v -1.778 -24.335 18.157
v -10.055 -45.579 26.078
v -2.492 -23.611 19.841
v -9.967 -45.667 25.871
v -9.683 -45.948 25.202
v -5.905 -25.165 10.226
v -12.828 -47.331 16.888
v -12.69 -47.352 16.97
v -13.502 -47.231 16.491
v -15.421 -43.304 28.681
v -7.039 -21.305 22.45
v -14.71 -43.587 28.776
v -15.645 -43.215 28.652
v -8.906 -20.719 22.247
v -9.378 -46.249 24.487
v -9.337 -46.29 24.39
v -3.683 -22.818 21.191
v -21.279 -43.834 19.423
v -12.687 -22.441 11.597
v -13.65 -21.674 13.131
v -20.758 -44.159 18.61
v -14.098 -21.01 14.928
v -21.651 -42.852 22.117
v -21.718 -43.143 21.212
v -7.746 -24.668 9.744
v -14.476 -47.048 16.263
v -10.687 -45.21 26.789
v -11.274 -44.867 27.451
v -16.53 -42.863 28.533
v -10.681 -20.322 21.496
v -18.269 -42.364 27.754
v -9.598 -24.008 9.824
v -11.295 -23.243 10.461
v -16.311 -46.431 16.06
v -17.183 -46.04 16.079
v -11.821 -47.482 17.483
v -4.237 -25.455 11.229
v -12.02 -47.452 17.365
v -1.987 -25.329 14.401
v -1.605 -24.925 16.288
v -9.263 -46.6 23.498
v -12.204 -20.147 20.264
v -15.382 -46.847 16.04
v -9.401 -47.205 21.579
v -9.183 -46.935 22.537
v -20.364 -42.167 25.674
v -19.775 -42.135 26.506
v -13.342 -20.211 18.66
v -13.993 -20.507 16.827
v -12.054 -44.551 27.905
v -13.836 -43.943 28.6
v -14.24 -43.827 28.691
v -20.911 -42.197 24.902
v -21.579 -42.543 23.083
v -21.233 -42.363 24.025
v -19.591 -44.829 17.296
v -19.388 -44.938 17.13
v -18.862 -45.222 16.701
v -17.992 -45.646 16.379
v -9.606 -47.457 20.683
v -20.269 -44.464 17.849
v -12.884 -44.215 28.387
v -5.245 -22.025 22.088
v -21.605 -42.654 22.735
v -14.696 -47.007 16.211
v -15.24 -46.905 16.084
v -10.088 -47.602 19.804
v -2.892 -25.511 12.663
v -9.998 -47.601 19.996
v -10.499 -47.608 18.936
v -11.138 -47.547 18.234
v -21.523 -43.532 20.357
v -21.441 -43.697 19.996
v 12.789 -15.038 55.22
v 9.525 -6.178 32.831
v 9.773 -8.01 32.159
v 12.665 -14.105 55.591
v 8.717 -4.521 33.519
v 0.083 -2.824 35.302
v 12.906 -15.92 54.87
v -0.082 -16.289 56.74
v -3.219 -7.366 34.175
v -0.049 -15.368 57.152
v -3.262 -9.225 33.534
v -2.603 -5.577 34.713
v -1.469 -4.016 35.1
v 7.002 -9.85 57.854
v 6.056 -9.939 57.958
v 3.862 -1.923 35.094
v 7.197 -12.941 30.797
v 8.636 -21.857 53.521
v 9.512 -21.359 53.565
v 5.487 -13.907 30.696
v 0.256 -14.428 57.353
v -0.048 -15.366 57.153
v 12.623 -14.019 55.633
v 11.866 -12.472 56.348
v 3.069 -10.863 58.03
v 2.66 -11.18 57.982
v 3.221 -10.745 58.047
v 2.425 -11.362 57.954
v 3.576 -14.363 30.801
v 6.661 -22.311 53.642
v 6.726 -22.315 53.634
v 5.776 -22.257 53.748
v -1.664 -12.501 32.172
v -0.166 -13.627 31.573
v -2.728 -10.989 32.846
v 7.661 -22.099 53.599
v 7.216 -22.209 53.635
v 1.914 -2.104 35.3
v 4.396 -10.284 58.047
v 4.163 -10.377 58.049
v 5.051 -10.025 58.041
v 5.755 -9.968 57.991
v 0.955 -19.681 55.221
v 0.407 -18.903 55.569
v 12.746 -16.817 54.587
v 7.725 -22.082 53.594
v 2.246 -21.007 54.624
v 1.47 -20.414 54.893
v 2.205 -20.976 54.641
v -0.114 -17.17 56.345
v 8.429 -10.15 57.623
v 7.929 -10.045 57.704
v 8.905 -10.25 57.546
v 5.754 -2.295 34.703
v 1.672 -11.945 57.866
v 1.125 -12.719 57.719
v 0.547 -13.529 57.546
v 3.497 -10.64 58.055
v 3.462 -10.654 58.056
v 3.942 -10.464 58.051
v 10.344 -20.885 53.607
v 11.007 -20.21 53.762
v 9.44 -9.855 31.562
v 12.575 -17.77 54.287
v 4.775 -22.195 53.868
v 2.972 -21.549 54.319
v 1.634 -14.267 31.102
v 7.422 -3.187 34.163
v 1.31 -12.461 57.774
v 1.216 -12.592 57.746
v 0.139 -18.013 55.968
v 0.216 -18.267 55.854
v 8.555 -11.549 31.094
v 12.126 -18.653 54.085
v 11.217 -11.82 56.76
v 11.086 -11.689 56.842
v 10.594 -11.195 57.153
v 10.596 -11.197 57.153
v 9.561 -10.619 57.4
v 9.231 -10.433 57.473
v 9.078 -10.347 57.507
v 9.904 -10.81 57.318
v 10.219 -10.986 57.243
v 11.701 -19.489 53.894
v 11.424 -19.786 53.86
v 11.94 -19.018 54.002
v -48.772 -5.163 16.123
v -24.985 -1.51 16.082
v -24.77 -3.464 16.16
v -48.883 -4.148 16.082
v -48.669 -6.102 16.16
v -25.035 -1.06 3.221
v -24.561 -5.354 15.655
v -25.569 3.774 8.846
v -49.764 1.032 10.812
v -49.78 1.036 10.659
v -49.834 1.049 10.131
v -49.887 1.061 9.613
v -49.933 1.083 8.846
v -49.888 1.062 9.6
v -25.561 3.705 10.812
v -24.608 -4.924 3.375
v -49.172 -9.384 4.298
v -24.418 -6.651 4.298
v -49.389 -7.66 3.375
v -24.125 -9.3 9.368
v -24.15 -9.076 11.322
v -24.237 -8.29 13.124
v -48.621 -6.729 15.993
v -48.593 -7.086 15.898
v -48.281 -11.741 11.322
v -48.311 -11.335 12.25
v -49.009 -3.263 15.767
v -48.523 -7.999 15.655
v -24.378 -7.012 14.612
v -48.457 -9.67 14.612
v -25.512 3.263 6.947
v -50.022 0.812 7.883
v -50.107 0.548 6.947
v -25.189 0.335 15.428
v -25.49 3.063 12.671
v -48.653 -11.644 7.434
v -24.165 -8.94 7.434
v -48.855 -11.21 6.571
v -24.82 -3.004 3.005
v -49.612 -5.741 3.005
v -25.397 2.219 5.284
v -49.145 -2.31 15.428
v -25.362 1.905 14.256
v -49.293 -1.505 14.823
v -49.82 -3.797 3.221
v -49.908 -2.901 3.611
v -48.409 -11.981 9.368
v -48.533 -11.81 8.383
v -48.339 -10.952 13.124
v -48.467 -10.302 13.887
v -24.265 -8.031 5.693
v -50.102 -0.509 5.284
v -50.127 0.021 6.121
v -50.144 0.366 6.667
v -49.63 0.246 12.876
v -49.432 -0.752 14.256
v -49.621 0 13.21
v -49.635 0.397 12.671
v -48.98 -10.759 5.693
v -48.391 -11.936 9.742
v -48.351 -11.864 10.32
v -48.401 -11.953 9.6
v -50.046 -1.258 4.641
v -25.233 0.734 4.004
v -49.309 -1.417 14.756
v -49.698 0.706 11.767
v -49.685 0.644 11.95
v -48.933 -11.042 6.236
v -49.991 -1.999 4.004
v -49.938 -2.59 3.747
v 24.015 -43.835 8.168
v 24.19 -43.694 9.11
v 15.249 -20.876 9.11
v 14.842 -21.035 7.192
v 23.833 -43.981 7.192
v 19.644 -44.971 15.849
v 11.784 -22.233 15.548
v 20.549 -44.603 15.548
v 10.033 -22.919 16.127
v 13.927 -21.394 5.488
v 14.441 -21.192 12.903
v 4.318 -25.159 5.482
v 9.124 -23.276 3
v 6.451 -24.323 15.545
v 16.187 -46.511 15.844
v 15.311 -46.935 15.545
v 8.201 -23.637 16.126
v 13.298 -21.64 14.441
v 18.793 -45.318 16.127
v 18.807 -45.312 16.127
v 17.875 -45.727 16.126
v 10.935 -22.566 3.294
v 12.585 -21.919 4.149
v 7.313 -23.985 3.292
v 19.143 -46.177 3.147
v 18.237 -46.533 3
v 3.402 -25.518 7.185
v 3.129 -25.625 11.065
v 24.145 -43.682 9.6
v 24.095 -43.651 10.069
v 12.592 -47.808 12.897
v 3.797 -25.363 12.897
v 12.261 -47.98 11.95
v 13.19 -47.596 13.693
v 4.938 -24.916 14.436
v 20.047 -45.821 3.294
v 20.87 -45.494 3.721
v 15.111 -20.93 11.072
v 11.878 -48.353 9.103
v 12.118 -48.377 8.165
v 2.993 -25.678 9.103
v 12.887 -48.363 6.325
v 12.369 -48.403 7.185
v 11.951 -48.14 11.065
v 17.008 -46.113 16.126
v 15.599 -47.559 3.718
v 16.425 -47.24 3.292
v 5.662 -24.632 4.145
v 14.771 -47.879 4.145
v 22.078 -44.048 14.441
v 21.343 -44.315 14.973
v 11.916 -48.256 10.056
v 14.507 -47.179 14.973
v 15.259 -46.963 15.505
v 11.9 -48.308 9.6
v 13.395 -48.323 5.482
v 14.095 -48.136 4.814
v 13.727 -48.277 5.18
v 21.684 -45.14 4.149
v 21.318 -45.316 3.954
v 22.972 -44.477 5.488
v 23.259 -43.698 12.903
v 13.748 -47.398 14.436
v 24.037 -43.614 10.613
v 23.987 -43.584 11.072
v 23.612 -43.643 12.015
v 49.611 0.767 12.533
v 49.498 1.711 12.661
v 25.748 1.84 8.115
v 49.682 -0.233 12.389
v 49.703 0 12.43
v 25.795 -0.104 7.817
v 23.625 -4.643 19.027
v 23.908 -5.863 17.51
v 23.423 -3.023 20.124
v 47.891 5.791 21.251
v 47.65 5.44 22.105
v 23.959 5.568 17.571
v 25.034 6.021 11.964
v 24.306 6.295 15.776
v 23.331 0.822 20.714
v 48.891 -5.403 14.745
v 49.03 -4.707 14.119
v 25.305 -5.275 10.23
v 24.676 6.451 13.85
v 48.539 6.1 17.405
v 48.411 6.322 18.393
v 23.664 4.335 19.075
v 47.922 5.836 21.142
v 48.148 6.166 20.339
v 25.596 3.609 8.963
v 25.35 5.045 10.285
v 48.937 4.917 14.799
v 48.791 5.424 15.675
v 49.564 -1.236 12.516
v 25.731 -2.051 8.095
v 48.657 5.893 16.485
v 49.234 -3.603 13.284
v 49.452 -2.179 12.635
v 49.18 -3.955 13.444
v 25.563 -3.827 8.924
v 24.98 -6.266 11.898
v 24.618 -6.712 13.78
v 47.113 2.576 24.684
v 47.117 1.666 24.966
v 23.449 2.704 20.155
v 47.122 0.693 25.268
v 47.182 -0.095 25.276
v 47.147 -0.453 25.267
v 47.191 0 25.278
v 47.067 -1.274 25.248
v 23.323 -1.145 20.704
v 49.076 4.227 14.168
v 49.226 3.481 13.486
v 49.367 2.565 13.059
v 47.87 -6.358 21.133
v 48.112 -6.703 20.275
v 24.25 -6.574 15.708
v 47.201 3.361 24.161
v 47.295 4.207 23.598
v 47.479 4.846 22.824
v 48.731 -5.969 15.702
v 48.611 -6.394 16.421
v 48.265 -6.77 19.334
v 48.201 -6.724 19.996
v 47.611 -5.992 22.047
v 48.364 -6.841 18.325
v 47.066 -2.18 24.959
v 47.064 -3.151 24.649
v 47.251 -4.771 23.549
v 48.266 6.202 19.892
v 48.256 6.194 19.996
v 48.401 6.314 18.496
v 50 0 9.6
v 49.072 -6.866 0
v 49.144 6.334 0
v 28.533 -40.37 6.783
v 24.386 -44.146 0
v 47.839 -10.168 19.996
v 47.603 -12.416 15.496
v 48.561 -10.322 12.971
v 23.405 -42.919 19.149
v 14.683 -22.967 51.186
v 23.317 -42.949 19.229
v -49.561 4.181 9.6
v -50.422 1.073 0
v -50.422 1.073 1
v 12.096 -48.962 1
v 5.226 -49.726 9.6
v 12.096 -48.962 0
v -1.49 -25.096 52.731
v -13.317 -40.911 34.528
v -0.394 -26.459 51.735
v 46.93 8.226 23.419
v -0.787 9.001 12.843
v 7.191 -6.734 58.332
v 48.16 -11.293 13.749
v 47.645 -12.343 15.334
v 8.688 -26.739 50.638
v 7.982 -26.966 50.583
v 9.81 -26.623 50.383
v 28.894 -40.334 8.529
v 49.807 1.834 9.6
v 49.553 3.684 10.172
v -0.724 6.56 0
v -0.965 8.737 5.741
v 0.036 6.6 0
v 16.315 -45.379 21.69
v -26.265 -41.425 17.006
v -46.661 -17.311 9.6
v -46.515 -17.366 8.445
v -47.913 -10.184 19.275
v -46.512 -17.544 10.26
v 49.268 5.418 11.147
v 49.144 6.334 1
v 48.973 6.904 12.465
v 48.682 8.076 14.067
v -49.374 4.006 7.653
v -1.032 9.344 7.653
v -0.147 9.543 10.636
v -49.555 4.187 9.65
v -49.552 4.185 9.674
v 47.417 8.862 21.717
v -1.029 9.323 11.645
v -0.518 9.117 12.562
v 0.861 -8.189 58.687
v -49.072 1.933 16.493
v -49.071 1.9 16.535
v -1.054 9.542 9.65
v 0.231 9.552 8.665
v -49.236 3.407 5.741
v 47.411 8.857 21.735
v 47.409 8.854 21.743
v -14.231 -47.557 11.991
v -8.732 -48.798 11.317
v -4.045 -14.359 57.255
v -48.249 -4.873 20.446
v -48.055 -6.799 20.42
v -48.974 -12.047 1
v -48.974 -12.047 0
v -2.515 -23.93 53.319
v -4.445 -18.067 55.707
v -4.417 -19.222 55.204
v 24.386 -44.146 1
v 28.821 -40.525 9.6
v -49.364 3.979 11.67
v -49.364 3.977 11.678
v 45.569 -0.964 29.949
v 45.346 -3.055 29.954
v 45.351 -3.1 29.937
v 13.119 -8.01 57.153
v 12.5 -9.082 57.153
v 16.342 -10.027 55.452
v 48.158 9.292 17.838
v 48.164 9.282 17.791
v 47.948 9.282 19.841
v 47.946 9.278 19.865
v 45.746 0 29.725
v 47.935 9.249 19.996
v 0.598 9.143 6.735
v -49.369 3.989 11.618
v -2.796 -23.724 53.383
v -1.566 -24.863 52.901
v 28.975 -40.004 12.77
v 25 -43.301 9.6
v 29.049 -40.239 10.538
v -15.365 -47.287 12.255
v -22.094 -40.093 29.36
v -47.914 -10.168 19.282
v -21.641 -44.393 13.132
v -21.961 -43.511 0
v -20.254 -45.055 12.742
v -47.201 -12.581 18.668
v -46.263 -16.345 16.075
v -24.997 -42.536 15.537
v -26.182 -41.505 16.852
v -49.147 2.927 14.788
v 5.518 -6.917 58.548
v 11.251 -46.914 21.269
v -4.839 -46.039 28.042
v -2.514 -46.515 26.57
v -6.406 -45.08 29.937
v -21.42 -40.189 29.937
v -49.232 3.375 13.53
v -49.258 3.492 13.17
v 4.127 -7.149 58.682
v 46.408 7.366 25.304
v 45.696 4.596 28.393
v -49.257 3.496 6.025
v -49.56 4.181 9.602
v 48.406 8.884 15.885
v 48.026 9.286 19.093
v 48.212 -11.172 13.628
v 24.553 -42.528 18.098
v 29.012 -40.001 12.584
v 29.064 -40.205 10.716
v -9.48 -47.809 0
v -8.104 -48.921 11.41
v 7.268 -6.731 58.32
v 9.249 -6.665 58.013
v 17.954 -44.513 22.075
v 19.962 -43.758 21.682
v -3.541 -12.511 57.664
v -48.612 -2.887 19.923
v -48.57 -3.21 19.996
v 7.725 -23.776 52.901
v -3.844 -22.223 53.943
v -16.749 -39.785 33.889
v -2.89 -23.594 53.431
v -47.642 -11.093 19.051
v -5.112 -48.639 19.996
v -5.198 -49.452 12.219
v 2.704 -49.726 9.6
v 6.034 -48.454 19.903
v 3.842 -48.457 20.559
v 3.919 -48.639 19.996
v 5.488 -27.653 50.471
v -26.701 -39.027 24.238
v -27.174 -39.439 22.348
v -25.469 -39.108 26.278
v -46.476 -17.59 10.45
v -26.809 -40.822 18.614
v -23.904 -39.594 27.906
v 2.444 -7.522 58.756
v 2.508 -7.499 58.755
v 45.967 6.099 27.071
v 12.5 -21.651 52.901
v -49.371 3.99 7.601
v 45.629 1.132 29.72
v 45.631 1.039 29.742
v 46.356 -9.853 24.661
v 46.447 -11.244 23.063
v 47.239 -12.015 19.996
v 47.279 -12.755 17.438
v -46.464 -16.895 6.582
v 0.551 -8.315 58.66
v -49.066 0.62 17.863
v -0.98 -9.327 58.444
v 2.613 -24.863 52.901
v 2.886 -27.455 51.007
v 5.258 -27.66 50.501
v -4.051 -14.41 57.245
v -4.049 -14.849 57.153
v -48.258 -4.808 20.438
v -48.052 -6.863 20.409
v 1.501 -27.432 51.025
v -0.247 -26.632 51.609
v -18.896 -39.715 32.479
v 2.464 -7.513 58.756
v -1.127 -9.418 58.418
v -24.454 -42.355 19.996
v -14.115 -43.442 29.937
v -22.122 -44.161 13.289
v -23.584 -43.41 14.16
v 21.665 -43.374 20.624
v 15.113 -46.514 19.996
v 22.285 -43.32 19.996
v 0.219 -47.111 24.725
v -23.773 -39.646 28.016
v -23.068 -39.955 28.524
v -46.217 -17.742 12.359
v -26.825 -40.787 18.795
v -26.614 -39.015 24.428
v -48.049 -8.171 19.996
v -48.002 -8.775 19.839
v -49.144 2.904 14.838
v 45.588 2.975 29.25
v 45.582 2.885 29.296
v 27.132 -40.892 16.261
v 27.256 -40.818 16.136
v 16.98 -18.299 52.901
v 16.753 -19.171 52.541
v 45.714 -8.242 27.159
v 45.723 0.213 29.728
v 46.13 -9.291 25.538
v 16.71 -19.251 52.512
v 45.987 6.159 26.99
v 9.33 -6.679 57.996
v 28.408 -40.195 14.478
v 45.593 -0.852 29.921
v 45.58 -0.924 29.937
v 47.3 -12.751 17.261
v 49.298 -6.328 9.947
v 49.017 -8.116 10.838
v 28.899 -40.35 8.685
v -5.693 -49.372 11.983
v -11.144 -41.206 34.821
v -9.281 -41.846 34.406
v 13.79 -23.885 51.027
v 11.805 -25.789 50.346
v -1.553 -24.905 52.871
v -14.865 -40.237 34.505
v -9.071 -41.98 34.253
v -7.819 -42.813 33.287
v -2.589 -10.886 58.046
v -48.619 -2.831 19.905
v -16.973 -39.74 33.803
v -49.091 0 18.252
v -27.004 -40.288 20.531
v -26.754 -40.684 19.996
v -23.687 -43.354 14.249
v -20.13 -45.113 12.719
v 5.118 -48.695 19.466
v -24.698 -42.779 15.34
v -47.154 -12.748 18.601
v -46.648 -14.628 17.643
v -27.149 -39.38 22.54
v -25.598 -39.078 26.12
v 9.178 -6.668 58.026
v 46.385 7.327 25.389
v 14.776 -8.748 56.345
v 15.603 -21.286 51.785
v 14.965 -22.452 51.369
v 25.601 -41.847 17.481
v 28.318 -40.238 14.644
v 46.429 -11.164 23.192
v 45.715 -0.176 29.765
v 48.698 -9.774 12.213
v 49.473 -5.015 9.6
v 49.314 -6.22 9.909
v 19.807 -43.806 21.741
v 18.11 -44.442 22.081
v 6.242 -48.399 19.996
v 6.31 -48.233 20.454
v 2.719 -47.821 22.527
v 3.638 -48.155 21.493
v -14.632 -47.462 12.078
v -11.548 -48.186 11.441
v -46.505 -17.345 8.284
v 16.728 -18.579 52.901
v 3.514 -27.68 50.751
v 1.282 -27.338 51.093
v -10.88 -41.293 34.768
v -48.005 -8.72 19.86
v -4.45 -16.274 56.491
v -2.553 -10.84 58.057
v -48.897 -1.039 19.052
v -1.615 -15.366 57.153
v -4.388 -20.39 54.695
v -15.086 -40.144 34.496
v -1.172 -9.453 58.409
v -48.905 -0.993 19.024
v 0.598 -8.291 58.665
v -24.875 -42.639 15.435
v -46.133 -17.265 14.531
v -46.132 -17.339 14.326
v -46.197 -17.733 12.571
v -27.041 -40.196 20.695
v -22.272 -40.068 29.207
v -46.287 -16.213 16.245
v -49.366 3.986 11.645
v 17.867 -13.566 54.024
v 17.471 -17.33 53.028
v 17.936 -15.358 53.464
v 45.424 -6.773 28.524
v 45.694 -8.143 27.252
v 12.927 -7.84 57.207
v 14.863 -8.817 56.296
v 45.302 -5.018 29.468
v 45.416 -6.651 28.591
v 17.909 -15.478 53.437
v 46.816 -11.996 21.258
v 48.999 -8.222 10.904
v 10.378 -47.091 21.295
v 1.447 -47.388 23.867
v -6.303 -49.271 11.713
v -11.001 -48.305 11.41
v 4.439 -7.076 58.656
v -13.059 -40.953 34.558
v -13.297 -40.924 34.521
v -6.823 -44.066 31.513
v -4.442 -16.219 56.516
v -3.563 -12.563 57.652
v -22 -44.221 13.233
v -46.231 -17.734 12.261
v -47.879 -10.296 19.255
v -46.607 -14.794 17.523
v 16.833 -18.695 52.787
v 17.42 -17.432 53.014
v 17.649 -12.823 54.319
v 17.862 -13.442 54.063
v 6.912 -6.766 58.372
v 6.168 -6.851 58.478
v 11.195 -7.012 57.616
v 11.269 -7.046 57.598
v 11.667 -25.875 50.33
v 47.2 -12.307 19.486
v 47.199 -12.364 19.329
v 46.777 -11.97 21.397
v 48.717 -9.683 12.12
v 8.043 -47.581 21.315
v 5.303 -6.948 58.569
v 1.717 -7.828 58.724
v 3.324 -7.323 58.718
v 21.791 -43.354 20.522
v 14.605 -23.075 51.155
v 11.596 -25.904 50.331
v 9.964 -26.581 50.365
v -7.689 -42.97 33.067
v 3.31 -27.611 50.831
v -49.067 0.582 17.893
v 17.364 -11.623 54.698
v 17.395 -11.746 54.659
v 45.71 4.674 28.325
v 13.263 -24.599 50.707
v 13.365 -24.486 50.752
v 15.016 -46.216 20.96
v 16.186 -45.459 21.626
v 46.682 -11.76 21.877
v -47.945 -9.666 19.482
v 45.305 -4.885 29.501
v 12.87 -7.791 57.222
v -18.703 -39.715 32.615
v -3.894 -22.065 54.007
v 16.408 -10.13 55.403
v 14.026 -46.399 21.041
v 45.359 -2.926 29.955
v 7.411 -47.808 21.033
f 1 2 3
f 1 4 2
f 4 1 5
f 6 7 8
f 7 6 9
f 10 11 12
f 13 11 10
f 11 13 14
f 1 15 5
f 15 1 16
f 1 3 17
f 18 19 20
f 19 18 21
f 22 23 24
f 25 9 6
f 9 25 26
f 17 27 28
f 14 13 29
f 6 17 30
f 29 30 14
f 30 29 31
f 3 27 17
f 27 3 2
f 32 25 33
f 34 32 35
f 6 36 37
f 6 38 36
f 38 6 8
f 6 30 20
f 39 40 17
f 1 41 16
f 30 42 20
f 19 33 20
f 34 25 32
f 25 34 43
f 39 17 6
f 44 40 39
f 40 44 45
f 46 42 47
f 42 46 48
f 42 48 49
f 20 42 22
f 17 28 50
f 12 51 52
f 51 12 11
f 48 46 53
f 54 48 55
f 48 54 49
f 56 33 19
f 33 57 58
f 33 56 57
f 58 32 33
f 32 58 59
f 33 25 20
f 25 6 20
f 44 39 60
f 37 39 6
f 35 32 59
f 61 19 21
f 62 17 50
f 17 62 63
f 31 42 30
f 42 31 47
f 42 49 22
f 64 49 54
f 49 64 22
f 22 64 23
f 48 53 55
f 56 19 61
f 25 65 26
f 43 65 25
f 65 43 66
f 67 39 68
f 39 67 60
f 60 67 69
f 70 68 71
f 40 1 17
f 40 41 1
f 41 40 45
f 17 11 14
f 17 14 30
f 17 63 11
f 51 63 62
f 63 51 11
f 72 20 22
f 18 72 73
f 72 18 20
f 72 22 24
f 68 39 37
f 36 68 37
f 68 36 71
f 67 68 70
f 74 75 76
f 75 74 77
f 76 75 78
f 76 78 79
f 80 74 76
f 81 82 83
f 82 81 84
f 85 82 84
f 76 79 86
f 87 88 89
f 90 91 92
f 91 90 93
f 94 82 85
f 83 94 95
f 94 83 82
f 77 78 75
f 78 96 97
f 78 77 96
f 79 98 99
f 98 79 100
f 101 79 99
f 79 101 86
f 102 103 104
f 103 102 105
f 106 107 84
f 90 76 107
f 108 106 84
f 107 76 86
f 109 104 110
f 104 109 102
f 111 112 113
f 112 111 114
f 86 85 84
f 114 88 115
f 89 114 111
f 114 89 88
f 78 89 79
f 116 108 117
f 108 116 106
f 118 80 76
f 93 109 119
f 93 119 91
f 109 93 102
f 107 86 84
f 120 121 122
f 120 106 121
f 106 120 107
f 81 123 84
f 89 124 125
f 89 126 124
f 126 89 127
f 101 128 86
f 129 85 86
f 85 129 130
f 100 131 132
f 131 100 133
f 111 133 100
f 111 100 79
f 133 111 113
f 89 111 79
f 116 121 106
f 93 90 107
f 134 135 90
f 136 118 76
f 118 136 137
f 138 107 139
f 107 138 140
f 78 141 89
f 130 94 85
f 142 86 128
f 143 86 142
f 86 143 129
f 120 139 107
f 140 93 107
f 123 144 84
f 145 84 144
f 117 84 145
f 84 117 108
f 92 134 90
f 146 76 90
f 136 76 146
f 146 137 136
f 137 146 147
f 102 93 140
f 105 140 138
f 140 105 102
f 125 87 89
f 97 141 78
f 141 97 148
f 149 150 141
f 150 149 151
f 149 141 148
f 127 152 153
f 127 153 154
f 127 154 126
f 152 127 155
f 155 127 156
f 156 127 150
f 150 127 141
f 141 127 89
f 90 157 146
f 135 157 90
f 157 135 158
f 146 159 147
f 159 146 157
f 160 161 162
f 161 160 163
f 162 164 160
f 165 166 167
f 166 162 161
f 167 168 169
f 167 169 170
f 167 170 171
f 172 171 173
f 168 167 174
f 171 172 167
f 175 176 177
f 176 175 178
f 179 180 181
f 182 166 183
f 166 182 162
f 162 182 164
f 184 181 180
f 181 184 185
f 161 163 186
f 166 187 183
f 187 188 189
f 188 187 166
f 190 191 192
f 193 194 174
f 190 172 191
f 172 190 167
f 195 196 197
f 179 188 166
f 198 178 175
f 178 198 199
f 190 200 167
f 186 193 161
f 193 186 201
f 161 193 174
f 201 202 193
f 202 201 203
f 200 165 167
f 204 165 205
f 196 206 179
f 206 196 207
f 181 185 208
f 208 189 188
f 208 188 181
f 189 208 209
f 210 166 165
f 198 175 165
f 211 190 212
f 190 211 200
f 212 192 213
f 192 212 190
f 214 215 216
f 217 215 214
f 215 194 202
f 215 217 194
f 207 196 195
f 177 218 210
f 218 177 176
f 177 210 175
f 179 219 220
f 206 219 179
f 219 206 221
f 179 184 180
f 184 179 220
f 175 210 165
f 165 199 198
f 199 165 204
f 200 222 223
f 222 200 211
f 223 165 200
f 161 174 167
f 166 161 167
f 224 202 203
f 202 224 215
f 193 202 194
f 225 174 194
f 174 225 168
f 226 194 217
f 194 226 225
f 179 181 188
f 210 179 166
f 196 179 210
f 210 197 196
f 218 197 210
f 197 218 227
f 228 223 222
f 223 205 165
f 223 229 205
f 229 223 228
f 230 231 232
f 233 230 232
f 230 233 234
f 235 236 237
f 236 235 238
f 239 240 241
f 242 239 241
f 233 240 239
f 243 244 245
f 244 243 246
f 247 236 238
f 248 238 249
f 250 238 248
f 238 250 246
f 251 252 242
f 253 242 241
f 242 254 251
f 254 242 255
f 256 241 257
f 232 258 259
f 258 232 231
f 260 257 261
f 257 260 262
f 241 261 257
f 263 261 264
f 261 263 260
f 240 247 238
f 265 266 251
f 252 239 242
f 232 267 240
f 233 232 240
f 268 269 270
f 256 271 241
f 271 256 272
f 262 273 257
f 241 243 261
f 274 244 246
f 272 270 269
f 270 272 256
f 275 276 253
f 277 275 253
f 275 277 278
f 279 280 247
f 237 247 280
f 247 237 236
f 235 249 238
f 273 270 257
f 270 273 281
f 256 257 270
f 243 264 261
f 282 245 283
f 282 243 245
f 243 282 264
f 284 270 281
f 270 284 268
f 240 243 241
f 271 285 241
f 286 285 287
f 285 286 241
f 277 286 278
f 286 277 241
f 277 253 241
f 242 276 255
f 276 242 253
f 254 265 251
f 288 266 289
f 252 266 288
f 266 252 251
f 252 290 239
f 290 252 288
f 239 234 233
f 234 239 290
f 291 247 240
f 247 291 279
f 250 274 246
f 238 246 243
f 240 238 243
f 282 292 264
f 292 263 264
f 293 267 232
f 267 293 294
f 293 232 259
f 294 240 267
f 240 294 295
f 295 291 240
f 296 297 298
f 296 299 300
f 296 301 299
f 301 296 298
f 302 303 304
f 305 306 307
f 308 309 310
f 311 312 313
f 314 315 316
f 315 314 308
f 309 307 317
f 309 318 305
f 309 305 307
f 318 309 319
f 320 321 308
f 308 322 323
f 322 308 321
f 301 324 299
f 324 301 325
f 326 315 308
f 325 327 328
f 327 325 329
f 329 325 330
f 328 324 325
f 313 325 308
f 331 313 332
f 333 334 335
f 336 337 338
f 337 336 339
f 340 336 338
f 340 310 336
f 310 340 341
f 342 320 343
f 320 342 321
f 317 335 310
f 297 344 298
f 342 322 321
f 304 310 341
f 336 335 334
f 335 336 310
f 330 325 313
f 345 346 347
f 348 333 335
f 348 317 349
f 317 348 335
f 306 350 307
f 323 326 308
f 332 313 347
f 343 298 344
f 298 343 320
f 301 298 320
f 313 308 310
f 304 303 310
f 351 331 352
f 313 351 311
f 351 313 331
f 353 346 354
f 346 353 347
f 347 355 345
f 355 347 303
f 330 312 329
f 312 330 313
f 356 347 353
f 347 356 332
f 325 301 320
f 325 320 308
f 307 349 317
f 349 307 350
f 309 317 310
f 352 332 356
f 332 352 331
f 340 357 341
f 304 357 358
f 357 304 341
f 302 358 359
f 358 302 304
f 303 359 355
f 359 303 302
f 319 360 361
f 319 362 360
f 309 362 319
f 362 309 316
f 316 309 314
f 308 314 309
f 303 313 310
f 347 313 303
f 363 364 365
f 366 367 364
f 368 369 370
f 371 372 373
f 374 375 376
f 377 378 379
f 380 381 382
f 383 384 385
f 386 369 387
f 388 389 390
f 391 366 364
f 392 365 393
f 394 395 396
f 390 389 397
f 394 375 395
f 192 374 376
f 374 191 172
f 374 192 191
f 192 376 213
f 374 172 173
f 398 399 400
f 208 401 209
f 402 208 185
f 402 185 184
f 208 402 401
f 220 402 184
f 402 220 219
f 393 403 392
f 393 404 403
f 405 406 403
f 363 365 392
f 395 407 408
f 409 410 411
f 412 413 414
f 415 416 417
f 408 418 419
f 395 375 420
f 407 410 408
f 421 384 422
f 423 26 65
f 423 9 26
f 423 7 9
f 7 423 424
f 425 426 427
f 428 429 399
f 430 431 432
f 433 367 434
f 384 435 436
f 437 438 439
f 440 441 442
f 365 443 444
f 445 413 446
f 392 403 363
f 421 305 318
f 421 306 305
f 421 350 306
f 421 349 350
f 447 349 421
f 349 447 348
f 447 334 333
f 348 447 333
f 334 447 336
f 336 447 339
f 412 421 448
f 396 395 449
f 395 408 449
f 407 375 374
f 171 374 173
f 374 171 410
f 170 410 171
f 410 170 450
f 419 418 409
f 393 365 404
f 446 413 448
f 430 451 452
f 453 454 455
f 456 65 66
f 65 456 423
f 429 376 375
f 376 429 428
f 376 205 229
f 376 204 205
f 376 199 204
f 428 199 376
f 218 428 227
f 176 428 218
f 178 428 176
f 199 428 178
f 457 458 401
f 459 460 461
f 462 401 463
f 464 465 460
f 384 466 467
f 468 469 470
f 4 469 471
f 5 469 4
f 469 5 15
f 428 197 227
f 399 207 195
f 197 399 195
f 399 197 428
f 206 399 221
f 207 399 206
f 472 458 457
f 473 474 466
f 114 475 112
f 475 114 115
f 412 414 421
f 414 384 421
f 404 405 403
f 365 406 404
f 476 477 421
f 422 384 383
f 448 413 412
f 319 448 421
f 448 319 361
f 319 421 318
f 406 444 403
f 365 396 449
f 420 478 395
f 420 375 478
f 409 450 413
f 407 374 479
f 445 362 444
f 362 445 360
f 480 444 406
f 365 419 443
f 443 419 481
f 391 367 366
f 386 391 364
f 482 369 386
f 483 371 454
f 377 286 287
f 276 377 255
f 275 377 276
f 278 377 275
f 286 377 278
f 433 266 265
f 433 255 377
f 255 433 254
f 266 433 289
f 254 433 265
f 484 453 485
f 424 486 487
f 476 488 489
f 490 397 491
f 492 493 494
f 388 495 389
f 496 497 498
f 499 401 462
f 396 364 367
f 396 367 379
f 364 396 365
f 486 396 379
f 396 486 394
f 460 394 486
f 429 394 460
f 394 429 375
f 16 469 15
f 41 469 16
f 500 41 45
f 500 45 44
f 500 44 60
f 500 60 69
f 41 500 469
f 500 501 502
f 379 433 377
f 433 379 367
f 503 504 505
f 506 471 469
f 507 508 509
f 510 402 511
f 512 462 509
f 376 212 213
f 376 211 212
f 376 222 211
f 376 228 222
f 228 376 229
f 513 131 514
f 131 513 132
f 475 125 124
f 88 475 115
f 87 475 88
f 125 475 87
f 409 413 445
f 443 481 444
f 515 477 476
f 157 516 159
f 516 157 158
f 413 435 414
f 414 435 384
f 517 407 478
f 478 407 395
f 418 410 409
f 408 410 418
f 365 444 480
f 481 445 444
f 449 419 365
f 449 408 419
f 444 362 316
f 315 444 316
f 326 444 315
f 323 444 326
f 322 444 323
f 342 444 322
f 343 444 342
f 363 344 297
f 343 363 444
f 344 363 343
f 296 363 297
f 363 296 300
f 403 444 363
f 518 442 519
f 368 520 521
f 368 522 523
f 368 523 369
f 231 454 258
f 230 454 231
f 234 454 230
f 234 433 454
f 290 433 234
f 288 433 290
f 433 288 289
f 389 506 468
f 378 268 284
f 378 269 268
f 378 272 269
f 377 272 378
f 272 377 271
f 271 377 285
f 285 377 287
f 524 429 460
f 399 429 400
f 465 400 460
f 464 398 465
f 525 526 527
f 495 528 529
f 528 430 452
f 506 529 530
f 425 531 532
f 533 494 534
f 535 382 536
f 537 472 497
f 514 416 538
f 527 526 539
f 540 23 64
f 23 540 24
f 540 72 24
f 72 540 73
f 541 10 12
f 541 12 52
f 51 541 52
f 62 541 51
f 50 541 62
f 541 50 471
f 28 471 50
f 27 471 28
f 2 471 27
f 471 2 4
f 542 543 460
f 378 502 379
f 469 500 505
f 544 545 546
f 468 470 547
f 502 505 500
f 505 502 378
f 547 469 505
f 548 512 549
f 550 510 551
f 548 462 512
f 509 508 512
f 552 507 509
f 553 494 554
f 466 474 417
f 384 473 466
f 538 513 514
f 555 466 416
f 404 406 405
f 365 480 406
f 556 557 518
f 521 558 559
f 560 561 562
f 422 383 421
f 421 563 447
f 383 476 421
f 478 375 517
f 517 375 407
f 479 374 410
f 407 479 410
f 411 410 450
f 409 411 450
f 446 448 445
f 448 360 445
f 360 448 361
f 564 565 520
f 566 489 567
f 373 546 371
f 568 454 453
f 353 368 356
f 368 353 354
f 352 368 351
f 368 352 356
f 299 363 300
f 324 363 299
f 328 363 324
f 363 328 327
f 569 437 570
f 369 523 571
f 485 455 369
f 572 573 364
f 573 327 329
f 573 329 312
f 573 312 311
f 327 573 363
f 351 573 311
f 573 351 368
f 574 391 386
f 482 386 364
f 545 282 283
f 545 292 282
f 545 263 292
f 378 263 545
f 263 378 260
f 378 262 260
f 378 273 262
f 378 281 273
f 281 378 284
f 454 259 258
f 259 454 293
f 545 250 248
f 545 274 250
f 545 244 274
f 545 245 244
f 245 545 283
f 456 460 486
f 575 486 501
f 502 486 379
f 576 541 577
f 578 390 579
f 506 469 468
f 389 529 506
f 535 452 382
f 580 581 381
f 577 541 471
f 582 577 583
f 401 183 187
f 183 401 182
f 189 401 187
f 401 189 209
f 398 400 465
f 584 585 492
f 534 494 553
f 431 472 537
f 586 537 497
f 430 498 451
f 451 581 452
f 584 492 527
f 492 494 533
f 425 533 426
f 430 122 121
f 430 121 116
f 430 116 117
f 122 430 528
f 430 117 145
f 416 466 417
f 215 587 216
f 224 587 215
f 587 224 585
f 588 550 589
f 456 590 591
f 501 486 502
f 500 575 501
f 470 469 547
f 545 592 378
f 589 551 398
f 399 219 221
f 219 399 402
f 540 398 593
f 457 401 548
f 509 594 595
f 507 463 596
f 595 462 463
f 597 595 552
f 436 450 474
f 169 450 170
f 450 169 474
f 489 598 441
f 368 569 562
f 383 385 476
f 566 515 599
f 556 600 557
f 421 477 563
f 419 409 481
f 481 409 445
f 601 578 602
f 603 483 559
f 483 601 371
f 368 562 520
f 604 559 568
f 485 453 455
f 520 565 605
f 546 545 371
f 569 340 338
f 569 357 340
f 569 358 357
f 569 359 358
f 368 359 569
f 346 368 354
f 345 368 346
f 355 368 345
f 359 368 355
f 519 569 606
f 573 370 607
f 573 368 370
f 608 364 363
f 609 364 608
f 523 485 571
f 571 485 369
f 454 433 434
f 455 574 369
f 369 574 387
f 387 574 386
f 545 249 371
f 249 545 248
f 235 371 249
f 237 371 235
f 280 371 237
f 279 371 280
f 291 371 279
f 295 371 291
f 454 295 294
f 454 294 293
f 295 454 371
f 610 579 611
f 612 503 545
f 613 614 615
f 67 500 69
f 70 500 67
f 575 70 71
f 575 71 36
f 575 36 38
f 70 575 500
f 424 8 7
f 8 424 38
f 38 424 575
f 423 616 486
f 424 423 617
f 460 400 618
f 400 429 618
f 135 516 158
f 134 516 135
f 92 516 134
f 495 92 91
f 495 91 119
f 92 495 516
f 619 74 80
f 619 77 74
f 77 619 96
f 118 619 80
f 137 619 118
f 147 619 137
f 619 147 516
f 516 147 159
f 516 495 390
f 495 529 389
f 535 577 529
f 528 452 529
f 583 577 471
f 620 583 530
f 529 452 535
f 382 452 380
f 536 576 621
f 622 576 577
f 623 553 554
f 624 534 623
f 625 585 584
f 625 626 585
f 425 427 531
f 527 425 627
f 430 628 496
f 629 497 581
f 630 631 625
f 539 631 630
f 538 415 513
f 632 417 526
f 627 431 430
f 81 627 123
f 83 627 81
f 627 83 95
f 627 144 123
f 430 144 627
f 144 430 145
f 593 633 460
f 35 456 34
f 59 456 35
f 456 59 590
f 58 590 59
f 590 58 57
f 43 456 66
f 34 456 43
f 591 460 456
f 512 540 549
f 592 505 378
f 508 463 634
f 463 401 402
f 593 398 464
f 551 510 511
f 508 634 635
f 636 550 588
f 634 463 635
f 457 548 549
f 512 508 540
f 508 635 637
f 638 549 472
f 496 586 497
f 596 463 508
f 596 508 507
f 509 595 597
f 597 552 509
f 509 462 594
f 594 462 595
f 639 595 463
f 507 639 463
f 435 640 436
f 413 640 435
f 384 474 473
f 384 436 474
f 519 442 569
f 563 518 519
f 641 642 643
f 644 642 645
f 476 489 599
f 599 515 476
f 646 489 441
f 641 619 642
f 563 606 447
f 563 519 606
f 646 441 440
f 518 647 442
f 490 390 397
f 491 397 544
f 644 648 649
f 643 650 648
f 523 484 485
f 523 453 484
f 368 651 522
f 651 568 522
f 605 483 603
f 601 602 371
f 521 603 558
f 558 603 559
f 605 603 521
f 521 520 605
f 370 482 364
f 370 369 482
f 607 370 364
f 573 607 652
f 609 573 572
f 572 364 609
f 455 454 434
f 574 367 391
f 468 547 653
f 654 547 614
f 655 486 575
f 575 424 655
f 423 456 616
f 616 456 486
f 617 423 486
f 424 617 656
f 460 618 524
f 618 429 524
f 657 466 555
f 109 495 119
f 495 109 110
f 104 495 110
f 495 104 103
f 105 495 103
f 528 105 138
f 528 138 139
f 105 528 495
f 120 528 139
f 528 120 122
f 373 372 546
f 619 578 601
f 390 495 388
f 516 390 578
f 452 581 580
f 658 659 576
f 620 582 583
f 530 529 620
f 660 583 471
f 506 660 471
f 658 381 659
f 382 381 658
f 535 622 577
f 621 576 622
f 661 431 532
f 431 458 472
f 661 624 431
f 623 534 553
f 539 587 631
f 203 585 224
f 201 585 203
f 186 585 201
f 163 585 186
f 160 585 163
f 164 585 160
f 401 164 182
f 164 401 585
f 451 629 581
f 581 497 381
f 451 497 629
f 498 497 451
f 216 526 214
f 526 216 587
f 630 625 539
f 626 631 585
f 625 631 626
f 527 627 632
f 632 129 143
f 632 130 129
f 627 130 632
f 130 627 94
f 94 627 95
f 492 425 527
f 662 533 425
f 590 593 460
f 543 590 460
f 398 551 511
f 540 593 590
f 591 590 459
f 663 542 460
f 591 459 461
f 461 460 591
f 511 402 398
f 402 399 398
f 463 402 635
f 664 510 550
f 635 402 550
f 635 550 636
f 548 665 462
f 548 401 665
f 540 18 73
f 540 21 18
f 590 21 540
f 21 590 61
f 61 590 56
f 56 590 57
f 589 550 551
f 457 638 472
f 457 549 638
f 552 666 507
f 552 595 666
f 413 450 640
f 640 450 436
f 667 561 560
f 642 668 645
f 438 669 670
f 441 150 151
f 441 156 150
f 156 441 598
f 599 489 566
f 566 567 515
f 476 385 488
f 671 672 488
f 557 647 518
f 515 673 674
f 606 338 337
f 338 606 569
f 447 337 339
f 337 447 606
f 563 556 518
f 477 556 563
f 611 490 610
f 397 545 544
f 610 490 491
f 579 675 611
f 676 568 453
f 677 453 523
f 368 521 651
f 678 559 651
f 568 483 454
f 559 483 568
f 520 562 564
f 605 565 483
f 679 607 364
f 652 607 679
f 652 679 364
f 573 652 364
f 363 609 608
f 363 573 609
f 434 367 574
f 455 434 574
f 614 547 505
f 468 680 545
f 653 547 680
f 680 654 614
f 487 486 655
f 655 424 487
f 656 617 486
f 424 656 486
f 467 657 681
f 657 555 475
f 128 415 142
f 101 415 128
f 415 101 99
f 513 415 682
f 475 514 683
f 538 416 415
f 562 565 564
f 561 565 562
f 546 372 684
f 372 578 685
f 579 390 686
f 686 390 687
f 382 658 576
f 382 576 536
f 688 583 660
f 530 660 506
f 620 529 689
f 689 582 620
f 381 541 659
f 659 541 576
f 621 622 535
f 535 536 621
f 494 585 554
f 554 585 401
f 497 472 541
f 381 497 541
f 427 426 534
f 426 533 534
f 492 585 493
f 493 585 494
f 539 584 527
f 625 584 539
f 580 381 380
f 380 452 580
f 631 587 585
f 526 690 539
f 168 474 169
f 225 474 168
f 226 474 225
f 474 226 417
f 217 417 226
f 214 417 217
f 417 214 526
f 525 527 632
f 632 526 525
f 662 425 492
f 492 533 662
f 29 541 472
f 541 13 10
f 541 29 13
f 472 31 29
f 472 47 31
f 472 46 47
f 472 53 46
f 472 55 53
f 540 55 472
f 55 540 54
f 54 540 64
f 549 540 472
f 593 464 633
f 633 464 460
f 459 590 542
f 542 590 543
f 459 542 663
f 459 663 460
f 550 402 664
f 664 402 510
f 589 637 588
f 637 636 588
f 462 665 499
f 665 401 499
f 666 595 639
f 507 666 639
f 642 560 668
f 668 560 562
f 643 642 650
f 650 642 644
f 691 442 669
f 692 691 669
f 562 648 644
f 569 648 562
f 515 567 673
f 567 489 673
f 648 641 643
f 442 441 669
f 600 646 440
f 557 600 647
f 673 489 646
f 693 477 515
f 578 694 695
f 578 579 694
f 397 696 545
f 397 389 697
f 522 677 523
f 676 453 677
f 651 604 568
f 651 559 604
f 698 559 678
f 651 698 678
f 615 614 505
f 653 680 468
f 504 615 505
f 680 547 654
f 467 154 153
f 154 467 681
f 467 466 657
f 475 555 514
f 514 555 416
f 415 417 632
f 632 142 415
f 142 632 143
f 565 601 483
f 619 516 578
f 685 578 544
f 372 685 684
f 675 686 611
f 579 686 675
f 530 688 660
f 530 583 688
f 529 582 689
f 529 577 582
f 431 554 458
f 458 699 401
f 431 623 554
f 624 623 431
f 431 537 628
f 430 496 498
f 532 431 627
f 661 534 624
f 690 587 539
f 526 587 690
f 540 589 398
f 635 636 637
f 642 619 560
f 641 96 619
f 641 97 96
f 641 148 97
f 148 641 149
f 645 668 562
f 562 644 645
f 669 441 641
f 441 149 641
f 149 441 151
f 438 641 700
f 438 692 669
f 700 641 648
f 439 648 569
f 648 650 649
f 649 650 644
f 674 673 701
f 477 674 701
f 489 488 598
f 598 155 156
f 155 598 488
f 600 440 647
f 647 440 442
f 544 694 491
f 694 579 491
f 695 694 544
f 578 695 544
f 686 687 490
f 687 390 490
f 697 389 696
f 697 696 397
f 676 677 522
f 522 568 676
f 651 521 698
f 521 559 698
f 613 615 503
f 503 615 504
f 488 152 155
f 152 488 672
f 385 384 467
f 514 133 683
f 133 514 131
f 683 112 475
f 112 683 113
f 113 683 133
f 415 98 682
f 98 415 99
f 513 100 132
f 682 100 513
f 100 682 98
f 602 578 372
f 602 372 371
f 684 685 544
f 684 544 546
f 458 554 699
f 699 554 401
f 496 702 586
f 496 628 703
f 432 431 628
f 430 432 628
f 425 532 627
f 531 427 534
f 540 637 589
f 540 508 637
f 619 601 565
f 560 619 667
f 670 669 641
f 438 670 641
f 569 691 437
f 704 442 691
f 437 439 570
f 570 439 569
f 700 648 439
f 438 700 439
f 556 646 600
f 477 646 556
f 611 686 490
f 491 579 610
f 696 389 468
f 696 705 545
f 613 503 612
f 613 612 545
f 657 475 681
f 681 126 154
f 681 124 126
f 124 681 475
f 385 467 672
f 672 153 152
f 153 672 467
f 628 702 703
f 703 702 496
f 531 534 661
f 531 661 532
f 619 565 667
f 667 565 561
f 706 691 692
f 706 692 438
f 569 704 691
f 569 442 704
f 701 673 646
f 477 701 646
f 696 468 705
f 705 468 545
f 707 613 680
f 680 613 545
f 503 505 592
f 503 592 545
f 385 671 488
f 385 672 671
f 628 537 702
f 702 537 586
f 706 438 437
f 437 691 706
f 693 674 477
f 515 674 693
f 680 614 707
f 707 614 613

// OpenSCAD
difference() {
	hull() {
		union() {
			union() {
				rotate(a = -108.9979018264, v = [0, 0, 1]) {
					translate(v = [0, -6.6000000000, 0]) {
						cube(size = [48.2903447888, 13.2000000000, 1]);
					}
				}
				rotate(a = -68.3897116066, v = [0, 0, 1]) {
					translate(v = [0, -6.6000000000, 0]) {
						cube(size = [17.5400073937, 13.2000000000, 1]);
					}
				}
				rotate(a = -173.6993792927, v = [0, 0, 1]) {
					translate(v = [0, -6.6000000000, 0]) {
						cube(size = [50.0000000000, 13.2000000000, 1]);
					}
				}
				rotate(a = -68.6031289934, v = [0, 0, 1]) {
					translate(v = [0, -6.6000000000, 0]) {
						cube(size = [50.0000000000, 13.2000000000, 1]);
					}
				}
				rotate(a = -0.3103479835, v = [0, 0, 1]) {
					translate(v = [0, -6.6000000000, 0]) {
						cube(size = [49.1087030685, 13.2000000000, 1]);
					}
				}
			}
			translate(v = [0, 0, 9.6000000000]) {
				intersection() {
					hull() {
						rotate(a = 74.9737672518, v = [0.9132001337, -0.3144027867, -0.0000005988]) {
							cylinder(h = 50, r = 9.6000000000);
						}
						rotate(a = 20.5362957038, v = [0.3261434711, 0.1291957774, -0.0000004553]) {
							cylinder(h = 50, r = 9.6000000000);
						}
						rotate(a = 90.0000695614, v = [0.1097450790, -0.9939597666, 0.0000008842]) {
							cylinder(h = 50, r = 9.6000000000);
						}
						rotate(a = 90.0000356881, v = [0.9310757408, 0.3648259377, -0.0000012959]) {
							cylinder(h = 50, r = 9.6000000000);
						}
						rotate(a = 79.1653876103, v = [0.0053202002, 0.9821594652, -0.0000009875]) {
							cylinder(h = 50, r = 9.6000000000);
						}
					}
					sphere(r = 50);
				}
			}
		}
	}
	translate(v = [0, 0, 9.6000000000]) {
		rotate(a = 74.9737672518, v = [0.9132001337, -0.3144027867, -0.0000005988]) {
			translate(v = [0, 0, 25]) {
				cylinder(h = 50, r = 6.6000000000);
			}
		}
		rotate(a = 20.5362957038, v = [0.3261434711, 0.1291957774, -0.0000004553]) {
			translate(v = [0, 0, 25]) {
				cylinder(h = 50, r = 6.6000000000);
			}
		}
		rotate(a = 90.0000695614, v = [0.1097450790, -0.9939597666, 0.0000008842]) {
			translate(v = [0, 0, 25]) {
				cylinder(h = 50, r = 6.6000000000);
			}
		}
		rotate(a = 90.0000356881, v = [0.9310757408, 0.3648259377, -0.0000012959]) {
			translate(v = [0, 0, 25]) {
				cylinder(h = 50, r = 6.6000000000);
			}
		}
		rotate(a = 79.1653876103, v = [0.0053202002, 0.9821594652, -0.0000009875]) {
			translate(v = [0, 0, 25]) {
				cylinder(h = 50, r = 6.6000000000);
			}
		}
	}
}
